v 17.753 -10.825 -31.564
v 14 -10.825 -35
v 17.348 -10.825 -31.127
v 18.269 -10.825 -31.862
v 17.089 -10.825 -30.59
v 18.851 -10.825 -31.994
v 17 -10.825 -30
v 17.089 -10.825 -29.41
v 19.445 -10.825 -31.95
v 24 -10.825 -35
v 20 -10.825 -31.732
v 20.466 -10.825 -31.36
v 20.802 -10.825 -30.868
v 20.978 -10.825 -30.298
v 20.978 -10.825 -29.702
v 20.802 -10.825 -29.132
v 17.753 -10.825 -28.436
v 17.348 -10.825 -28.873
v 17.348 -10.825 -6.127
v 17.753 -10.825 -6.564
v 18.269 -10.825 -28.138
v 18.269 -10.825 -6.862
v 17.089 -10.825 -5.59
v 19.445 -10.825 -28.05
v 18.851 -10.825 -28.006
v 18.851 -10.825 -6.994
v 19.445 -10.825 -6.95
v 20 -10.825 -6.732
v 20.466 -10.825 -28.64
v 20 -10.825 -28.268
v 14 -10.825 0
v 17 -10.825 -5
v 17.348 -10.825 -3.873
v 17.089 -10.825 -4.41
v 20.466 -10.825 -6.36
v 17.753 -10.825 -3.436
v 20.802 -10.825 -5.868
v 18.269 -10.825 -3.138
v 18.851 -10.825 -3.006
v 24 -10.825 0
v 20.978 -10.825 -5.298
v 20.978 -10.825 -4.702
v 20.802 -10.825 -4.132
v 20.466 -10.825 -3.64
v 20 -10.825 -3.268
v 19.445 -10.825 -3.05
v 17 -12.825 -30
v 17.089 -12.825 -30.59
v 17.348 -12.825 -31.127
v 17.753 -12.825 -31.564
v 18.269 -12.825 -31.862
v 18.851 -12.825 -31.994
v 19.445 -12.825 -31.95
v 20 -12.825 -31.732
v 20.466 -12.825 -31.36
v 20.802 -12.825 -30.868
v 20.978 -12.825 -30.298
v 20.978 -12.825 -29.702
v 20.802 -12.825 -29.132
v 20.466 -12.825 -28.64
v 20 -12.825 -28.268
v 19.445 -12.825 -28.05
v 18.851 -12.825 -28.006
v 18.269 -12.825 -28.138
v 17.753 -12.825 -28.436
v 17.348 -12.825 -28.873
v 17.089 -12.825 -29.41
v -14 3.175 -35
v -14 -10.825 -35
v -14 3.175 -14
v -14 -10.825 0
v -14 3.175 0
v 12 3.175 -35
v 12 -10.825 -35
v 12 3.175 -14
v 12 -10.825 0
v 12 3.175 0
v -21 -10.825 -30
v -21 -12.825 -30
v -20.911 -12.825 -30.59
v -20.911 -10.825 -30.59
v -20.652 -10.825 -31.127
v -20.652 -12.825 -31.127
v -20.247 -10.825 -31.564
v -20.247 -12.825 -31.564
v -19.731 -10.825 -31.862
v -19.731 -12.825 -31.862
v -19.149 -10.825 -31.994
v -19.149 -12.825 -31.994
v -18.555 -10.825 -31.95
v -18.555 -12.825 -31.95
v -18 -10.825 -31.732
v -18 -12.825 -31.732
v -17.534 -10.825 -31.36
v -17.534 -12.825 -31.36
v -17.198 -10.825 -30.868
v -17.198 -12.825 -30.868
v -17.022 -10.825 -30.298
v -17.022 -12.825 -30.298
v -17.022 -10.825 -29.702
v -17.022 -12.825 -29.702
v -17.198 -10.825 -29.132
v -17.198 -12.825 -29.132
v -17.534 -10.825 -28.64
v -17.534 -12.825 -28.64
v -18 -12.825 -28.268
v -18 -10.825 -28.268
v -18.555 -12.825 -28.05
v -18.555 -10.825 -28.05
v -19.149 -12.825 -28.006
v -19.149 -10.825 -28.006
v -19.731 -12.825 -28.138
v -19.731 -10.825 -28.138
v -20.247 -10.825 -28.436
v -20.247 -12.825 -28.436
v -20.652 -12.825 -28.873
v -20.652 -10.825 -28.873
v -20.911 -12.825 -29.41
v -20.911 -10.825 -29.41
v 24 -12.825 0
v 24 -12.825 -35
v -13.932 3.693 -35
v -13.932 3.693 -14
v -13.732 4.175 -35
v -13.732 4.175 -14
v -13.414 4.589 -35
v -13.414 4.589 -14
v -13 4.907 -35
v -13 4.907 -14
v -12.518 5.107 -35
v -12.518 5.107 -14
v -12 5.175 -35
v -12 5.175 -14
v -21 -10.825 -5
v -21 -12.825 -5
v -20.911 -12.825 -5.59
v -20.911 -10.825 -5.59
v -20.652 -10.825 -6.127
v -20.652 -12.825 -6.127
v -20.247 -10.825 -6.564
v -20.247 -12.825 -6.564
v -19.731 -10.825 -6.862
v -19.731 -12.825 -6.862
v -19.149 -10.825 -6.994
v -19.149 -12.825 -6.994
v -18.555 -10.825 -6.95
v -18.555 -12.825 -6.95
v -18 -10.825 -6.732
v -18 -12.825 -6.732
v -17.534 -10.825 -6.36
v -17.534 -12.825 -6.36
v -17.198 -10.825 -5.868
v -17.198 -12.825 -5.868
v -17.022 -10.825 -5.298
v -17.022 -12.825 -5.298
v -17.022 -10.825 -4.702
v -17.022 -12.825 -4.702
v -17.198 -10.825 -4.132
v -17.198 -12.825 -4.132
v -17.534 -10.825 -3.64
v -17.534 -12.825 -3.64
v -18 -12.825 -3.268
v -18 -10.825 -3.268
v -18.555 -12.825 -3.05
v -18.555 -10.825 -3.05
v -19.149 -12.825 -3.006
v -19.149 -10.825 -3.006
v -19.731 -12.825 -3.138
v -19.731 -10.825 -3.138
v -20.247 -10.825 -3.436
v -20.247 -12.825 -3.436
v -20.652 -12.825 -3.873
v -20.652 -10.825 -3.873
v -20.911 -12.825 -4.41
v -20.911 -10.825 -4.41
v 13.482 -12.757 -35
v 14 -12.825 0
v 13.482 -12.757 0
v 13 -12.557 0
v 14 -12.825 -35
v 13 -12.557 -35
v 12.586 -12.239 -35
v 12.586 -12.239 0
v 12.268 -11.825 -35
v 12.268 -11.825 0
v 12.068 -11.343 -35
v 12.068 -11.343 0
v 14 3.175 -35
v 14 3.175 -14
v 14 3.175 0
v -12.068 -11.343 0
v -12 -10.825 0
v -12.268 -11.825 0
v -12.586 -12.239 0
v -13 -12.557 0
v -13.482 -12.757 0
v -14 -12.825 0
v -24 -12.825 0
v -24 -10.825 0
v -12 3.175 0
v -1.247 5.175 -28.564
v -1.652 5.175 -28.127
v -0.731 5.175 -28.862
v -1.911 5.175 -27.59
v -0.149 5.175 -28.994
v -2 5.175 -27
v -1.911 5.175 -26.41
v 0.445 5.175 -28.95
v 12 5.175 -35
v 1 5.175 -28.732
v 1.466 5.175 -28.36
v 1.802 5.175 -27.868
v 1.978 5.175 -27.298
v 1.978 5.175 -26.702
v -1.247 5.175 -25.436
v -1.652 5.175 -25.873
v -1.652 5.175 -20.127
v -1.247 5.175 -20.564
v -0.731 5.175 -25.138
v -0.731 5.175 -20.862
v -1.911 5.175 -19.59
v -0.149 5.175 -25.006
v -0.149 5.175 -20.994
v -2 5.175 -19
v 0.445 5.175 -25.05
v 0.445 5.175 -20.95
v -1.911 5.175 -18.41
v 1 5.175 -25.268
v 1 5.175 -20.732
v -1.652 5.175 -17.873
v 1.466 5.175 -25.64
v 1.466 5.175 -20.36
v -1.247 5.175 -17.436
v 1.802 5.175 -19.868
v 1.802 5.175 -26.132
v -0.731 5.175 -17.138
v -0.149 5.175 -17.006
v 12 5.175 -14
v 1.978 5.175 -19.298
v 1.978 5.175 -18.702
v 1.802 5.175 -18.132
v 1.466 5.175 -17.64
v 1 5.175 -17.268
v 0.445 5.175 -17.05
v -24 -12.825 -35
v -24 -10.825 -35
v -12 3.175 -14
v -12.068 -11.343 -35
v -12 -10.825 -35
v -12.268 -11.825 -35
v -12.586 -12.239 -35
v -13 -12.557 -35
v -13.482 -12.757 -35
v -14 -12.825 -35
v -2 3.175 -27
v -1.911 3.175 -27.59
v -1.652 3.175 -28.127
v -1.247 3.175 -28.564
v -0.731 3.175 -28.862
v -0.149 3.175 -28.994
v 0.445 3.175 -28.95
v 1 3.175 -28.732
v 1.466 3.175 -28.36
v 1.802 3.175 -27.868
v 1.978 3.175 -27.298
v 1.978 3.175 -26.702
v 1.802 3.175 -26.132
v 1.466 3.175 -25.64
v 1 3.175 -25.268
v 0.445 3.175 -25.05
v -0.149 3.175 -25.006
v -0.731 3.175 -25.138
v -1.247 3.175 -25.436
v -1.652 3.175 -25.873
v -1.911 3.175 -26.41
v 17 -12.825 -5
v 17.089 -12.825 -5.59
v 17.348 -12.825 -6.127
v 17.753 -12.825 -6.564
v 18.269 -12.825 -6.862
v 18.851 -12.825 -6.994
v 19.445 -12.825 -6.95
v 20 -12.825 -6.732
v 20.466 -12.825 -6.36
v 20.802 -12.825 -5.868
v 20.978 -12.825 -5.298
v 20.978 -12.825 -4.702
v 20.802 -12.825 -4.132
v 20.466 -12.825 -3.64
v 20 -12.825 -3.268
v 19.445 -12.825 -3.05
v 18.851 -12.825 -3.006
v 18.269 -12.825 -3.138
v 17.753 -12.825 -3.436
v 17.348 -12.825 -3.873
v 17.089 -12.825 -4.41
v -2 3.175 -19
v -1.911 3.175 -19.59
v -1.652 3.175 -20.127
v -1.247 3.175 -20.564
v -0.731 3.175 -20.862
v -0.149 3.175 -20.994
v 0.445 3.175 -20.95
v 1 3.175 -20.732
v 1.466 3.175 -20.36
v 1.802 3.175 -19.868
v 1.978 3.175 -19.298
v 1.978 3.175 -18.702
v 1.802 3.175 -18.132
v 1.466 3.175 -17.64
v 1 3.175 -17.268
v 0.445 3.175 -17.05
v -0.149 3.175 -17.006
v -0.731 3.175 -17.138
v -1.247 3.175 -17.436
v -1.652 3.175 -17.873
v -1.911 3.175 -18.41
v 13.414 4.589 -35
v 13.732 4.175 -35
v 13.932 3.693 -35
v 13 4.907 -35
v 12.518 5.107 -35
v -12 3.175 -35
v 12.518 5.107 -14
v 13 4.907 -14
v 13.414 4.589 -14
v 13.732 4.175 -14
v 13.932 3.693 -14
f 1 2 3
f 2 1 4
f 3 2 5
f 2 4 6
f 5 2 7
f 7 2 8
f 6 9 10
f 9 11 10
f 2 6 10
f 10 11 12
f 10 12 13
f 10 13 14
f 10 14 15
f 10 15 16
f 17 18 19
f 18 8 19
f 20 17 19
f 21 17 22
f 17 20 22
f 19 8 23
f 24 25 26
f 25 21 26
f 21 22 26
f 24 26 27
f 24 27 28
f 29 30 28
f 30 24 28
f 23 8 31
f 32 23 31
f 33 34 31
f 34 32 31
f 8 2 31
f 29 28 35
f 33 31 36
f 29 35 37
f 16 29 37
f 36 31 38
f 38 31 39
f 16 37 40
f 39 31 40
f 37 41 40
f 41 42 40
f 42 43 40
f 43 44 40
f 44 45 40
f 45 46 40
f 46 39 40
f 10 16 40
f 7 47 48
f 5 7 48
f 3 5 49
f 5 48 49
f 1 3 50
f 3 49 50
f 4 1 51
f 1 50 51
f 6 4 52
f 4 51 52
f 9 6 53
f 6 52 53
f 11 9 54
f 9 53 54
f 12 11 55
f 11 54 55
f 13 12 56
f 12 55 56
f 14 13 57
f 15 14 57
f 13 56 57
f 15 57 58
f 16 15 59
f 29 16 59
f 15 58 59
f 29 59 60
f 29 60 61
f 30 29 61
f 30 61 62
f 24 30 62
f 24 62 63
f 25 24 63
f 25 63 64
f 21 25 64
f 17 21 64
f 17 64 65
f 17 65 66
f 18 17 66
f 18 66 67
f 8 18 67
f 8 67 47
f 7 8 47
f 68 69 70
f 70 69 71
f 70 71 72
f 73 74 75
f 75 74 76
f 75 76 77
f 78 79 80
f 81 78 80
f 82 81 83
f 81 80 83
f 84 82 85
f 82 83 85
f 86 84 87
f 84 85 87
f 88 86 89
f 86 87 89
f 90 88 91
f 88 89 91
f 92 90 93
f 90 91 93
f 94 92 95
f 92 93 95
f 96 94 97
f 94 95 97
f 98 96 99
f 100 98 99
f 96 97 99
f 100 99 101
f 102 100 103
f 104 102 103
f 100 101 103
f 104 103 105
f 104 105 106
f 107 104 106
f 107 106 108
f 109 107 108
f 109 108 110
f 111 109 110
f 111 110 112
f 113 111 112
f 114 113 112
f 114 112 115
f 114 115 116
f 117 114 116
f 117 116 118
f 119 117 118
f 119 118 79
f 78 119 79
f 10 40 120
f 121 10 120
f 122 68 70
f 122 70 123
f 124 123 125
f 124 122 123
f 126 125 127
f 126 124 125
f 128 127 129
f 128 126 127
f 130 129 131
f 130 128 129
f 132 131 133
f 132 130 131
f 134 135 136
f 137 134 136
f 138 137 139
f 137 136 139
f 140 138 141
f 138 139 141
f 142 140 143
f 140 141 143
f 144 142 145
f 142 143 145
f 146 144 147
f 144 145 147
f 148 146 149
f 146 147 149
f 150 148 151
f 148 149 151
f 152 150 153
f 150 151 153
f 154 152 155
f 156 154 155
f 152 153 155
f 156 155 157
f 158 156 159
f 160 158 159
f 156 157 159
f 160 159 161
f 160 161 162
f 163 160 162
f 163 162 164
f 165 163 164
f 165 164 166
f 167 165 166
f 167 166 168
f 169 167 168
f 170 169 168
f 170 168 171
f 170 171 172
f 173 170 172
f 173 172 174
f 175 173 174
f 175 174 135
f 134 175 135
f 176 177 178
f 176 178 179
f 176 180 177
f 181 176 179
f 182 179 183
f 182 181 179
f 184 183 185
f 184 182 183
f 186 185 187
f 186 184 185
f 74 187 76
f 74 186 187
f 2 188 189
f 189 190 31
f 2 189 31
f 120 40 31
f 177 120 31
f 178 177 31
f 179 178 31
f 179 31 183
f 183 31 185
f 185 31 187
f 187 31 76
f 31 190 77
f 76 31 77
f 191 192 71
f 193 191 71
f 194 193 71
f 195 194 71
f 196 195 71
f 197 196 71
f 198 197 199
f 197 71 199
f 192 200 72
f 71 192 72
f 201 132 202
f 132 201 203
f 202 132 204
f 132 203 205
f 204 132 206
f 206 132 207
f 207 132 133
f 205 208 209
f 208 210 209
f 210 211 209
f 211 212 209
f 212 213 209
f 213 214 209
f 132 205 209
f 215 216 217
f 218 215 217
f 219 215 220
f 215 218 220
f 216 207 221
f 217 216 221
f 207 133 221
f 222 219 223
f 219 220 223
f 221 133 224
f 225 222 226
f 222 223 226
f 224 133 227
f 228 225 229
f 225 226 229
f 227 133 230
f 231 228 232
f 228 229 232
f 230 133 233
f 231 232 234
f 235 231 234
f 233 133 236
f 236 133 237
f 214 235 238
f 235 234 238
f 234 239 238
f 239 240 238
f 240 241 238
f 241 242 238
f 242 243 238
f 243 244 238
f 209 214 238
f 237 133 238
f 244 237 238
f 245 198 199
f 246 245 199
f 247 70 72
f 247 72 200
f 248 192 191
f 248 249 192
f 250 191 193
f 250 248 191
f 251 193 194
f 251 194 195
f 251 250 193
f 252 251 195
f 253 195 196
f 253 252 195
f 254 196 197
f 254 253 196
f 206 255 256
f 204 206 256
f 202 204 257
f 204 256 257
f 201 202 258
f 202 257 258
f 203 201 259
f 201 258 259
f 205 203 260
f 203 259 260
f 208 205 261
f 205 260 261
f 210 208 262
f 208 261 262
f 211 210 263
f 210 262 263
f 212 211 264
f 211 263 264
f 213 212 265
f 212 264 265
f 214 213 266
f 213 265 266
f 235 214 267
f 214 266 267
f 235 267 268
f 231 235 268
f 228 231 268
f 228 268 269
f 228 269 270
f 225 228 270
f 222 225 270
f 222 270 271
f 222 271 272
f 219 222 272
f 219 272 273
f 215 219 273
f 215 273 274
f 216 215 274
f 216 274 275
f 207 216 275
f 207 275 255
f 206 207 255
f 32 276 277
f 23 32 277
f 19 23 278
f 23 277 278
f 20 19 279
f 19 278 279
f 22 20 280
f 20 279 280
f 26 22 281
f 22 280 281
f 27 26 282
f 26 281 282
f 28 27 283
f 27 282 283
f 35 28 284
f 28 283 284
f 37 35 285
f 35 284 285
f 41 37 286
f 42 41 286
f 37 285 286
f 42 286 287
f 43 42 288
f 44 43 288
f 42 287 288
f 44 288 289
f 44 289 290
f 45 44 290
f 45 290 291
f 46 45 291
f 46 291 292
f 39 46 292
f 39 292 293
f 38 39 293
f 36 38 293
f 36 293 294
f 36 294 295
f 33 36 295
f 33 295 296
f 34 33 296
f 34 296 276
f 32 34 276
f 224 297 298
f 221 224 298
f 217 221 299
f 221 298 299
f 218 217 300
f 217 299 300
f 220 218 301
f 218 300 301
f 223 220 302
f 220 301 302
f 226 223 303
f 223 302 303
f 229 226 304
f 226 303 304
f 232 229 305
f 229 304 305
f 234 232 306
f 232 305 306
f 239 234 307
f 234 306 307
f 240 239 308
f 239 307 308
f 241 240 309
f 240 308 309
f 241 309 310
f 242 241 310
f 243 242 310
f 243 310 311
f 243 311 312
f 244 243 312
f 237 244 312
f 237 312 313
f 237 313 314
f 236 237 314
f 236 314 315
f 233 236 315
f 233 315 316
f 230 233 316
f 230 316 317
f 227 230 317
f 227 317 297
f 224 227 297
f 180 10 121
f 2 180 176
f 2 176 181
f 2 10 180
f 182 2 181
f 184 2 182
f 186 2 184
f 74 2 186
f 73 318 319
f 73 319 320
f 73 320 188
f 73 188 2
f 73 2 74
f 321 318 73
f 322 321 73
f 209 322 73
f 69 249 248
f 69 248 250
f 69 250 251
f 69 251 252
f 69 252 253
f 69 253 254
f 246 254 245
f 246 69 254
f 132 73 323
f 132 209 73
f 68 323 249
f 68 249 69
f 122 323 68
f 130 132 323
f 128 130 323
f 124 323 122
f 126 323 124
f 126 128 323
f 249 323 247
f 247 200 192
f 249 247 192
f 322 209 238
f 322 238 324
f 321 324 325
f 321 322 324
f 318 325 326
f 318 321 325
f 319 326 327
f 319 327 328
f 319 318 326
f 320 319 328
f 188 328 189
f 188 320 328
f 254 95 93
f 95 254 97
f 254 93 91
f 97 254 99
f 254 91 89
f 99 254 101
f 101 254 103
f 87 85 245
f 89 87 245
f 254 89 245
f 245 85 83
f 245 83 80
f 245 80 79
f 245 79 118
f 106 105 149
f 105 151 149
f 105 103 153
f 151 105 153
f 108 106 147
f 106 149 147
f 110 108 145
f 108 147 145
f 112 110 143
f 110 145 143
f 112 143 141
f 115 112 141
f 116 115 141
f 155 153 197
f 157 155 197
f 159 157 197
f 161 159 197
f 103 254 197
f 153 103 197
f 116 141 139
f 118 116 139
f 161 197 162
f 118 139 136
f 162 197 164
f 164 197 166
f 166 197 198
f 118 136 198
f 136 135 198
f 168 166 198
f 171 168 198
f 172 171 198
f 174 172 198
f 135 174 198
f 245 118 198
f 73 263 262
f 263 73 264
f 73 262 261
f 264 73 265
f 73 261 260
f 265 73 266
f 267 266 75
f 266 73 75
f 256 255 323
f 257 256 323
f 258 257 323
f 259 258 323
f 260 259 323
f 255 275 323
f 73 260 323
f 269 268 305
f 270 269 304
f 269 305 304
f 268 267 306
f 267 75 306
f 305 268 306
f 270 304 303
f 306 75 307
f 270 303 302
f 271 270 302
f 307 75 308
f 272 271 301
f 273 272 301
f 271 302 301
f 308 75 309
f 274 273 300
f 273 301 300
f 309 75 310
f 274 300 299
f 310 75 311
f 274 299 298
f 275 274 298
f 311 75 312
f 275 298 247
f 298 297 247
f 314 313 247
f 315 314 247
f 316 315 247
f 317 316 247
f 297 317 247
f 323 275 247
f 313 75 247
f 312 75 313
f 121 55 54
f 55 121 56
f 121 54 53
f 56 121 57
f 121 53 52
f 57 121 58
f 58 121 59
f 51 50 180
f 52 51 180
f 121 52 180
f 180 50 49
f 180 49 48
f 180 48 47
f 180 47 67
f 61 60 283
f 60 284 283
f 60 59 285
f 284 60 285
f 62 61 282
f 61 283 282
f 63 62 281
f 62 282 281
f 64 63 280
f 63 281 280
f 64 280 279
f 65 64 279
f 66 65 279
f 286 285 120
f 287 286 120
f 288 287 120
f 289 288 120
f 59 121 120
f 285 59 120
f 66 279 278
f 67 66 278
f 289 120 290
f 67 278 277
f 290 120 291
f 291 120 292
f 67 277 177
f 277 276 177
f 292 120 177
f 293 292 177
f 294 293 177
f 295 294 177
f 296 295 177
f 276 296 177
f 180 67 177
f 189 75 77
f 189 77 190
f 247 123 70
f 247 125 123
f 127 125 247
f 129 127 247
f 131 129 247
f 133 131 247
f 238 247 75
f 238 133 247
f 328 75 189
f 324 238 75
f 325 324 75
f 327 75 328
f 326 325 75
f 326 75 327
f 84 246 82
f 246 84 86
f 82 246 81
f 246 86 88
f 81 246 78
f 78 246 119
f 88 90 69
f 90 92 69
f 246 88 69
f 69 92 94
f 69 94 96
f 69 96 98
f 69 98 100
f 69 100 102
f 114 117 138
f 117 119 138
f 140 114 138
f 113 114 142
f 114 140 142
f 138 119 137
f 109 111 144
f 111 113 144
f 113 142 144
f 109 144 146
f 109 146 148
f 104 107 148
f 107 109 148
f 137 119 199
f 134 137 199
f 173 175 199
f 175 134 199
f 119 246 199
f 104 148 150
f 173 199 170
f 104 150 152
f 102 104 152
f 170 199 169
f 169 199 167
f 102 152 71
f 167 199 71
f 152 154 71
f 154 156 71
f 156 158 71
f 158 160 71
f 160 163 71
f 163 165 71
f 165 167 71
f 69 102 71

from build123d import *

# Parameters (mm, degrees)
BOSS_EXTRUDE1_DEPTH      = 35
FILLET1_R                = 2
FILLET2_R                = 2
SKETCH4_W                = 28
SKETCH4_H                = 14
CUT_EXTRUDE2_DEPTH       = 2
FILLET3_R                = 2
FILLET4_R                = 2
F_4_0_4_DIAMETER_HOLE1_D = 4


with BuildPart() as part:
    # Sketch1 → Boss-Extrude1 (new body)
    with BuildSketch(Plane.XY):
        Polygon((-12, 3.174979041), (-12, -12.825020959), (-24, -12.825020959), (-24, -10.825020959), (-14, -10.825020959), (-14, 5.174979041), (14, 5.174979041), (14, -10.825020959), (24, -10.825020959), (24, -12.825020959), (12, -12.825020959), (12, 3.174979041), align=None)
    extrude(amount=-BOSS_EXTRUDE1_DEPTH)

    # Fillet1
    fillet1_edges = [part.edges().sort_by_distance(p)[0] for p in [
        (-14, 5.174979041, -17.5),
    ]]
    fillet(fillet1_edges, radius=FILLET1_R)

    # Fillet2
    fillet2_edges = [part.edges().sort_by_distance(p)[0] for p in [
        (14, 5.174979041, -17.5),
    ]]
    fillet(fillet2_edges, radius=FILLET2_R)

    # Sketch4 → Cut-Extrude2 (cut)
    with BuildSketch(Plane(origin=(0, 5.174979041, 0), x_dir=(1, 0, 0), z_dir=(0, 1, 0))):
        with Locations((0, 7)):
            Rectangle(SKETCH4_W, SKETCH4_H)
    extrude(amount=-CUT_EXTRUDE2_DEPTH, mode=Mode.SUBTRACT)

    # Fillet3
    fillet3_edges = [part.edges().sort_by_distance(p)[0] for p in [
        (12, -12.825020959, -17.5),
    ]]
    fillet(fillet3_edges, radius=FILLET3_R)

    # Fillet4
    fillet4_edges = [part.edges().sort_by_distance(p)[0] for p in [
        (-12, -12.825020959, -17.5),
    ]]
    fillet(fillet4_edges, radius=FILLET4_R)

    # Ø4.0 (4) Diameter Hole1 (through all)
    with Locations(Plane(origin=(0, 5.174979041, 0), x_dir=(1, 0, 0), z_dir=(0, 1, 0))):
        with Locations((-19, 30), (-19, 5), (0, 27), (0, 19), (19, 30), (19, 5)):
            Hole(F_4_0_4_DIAMETER_HOLE1_D / 2)


solid = part.part
